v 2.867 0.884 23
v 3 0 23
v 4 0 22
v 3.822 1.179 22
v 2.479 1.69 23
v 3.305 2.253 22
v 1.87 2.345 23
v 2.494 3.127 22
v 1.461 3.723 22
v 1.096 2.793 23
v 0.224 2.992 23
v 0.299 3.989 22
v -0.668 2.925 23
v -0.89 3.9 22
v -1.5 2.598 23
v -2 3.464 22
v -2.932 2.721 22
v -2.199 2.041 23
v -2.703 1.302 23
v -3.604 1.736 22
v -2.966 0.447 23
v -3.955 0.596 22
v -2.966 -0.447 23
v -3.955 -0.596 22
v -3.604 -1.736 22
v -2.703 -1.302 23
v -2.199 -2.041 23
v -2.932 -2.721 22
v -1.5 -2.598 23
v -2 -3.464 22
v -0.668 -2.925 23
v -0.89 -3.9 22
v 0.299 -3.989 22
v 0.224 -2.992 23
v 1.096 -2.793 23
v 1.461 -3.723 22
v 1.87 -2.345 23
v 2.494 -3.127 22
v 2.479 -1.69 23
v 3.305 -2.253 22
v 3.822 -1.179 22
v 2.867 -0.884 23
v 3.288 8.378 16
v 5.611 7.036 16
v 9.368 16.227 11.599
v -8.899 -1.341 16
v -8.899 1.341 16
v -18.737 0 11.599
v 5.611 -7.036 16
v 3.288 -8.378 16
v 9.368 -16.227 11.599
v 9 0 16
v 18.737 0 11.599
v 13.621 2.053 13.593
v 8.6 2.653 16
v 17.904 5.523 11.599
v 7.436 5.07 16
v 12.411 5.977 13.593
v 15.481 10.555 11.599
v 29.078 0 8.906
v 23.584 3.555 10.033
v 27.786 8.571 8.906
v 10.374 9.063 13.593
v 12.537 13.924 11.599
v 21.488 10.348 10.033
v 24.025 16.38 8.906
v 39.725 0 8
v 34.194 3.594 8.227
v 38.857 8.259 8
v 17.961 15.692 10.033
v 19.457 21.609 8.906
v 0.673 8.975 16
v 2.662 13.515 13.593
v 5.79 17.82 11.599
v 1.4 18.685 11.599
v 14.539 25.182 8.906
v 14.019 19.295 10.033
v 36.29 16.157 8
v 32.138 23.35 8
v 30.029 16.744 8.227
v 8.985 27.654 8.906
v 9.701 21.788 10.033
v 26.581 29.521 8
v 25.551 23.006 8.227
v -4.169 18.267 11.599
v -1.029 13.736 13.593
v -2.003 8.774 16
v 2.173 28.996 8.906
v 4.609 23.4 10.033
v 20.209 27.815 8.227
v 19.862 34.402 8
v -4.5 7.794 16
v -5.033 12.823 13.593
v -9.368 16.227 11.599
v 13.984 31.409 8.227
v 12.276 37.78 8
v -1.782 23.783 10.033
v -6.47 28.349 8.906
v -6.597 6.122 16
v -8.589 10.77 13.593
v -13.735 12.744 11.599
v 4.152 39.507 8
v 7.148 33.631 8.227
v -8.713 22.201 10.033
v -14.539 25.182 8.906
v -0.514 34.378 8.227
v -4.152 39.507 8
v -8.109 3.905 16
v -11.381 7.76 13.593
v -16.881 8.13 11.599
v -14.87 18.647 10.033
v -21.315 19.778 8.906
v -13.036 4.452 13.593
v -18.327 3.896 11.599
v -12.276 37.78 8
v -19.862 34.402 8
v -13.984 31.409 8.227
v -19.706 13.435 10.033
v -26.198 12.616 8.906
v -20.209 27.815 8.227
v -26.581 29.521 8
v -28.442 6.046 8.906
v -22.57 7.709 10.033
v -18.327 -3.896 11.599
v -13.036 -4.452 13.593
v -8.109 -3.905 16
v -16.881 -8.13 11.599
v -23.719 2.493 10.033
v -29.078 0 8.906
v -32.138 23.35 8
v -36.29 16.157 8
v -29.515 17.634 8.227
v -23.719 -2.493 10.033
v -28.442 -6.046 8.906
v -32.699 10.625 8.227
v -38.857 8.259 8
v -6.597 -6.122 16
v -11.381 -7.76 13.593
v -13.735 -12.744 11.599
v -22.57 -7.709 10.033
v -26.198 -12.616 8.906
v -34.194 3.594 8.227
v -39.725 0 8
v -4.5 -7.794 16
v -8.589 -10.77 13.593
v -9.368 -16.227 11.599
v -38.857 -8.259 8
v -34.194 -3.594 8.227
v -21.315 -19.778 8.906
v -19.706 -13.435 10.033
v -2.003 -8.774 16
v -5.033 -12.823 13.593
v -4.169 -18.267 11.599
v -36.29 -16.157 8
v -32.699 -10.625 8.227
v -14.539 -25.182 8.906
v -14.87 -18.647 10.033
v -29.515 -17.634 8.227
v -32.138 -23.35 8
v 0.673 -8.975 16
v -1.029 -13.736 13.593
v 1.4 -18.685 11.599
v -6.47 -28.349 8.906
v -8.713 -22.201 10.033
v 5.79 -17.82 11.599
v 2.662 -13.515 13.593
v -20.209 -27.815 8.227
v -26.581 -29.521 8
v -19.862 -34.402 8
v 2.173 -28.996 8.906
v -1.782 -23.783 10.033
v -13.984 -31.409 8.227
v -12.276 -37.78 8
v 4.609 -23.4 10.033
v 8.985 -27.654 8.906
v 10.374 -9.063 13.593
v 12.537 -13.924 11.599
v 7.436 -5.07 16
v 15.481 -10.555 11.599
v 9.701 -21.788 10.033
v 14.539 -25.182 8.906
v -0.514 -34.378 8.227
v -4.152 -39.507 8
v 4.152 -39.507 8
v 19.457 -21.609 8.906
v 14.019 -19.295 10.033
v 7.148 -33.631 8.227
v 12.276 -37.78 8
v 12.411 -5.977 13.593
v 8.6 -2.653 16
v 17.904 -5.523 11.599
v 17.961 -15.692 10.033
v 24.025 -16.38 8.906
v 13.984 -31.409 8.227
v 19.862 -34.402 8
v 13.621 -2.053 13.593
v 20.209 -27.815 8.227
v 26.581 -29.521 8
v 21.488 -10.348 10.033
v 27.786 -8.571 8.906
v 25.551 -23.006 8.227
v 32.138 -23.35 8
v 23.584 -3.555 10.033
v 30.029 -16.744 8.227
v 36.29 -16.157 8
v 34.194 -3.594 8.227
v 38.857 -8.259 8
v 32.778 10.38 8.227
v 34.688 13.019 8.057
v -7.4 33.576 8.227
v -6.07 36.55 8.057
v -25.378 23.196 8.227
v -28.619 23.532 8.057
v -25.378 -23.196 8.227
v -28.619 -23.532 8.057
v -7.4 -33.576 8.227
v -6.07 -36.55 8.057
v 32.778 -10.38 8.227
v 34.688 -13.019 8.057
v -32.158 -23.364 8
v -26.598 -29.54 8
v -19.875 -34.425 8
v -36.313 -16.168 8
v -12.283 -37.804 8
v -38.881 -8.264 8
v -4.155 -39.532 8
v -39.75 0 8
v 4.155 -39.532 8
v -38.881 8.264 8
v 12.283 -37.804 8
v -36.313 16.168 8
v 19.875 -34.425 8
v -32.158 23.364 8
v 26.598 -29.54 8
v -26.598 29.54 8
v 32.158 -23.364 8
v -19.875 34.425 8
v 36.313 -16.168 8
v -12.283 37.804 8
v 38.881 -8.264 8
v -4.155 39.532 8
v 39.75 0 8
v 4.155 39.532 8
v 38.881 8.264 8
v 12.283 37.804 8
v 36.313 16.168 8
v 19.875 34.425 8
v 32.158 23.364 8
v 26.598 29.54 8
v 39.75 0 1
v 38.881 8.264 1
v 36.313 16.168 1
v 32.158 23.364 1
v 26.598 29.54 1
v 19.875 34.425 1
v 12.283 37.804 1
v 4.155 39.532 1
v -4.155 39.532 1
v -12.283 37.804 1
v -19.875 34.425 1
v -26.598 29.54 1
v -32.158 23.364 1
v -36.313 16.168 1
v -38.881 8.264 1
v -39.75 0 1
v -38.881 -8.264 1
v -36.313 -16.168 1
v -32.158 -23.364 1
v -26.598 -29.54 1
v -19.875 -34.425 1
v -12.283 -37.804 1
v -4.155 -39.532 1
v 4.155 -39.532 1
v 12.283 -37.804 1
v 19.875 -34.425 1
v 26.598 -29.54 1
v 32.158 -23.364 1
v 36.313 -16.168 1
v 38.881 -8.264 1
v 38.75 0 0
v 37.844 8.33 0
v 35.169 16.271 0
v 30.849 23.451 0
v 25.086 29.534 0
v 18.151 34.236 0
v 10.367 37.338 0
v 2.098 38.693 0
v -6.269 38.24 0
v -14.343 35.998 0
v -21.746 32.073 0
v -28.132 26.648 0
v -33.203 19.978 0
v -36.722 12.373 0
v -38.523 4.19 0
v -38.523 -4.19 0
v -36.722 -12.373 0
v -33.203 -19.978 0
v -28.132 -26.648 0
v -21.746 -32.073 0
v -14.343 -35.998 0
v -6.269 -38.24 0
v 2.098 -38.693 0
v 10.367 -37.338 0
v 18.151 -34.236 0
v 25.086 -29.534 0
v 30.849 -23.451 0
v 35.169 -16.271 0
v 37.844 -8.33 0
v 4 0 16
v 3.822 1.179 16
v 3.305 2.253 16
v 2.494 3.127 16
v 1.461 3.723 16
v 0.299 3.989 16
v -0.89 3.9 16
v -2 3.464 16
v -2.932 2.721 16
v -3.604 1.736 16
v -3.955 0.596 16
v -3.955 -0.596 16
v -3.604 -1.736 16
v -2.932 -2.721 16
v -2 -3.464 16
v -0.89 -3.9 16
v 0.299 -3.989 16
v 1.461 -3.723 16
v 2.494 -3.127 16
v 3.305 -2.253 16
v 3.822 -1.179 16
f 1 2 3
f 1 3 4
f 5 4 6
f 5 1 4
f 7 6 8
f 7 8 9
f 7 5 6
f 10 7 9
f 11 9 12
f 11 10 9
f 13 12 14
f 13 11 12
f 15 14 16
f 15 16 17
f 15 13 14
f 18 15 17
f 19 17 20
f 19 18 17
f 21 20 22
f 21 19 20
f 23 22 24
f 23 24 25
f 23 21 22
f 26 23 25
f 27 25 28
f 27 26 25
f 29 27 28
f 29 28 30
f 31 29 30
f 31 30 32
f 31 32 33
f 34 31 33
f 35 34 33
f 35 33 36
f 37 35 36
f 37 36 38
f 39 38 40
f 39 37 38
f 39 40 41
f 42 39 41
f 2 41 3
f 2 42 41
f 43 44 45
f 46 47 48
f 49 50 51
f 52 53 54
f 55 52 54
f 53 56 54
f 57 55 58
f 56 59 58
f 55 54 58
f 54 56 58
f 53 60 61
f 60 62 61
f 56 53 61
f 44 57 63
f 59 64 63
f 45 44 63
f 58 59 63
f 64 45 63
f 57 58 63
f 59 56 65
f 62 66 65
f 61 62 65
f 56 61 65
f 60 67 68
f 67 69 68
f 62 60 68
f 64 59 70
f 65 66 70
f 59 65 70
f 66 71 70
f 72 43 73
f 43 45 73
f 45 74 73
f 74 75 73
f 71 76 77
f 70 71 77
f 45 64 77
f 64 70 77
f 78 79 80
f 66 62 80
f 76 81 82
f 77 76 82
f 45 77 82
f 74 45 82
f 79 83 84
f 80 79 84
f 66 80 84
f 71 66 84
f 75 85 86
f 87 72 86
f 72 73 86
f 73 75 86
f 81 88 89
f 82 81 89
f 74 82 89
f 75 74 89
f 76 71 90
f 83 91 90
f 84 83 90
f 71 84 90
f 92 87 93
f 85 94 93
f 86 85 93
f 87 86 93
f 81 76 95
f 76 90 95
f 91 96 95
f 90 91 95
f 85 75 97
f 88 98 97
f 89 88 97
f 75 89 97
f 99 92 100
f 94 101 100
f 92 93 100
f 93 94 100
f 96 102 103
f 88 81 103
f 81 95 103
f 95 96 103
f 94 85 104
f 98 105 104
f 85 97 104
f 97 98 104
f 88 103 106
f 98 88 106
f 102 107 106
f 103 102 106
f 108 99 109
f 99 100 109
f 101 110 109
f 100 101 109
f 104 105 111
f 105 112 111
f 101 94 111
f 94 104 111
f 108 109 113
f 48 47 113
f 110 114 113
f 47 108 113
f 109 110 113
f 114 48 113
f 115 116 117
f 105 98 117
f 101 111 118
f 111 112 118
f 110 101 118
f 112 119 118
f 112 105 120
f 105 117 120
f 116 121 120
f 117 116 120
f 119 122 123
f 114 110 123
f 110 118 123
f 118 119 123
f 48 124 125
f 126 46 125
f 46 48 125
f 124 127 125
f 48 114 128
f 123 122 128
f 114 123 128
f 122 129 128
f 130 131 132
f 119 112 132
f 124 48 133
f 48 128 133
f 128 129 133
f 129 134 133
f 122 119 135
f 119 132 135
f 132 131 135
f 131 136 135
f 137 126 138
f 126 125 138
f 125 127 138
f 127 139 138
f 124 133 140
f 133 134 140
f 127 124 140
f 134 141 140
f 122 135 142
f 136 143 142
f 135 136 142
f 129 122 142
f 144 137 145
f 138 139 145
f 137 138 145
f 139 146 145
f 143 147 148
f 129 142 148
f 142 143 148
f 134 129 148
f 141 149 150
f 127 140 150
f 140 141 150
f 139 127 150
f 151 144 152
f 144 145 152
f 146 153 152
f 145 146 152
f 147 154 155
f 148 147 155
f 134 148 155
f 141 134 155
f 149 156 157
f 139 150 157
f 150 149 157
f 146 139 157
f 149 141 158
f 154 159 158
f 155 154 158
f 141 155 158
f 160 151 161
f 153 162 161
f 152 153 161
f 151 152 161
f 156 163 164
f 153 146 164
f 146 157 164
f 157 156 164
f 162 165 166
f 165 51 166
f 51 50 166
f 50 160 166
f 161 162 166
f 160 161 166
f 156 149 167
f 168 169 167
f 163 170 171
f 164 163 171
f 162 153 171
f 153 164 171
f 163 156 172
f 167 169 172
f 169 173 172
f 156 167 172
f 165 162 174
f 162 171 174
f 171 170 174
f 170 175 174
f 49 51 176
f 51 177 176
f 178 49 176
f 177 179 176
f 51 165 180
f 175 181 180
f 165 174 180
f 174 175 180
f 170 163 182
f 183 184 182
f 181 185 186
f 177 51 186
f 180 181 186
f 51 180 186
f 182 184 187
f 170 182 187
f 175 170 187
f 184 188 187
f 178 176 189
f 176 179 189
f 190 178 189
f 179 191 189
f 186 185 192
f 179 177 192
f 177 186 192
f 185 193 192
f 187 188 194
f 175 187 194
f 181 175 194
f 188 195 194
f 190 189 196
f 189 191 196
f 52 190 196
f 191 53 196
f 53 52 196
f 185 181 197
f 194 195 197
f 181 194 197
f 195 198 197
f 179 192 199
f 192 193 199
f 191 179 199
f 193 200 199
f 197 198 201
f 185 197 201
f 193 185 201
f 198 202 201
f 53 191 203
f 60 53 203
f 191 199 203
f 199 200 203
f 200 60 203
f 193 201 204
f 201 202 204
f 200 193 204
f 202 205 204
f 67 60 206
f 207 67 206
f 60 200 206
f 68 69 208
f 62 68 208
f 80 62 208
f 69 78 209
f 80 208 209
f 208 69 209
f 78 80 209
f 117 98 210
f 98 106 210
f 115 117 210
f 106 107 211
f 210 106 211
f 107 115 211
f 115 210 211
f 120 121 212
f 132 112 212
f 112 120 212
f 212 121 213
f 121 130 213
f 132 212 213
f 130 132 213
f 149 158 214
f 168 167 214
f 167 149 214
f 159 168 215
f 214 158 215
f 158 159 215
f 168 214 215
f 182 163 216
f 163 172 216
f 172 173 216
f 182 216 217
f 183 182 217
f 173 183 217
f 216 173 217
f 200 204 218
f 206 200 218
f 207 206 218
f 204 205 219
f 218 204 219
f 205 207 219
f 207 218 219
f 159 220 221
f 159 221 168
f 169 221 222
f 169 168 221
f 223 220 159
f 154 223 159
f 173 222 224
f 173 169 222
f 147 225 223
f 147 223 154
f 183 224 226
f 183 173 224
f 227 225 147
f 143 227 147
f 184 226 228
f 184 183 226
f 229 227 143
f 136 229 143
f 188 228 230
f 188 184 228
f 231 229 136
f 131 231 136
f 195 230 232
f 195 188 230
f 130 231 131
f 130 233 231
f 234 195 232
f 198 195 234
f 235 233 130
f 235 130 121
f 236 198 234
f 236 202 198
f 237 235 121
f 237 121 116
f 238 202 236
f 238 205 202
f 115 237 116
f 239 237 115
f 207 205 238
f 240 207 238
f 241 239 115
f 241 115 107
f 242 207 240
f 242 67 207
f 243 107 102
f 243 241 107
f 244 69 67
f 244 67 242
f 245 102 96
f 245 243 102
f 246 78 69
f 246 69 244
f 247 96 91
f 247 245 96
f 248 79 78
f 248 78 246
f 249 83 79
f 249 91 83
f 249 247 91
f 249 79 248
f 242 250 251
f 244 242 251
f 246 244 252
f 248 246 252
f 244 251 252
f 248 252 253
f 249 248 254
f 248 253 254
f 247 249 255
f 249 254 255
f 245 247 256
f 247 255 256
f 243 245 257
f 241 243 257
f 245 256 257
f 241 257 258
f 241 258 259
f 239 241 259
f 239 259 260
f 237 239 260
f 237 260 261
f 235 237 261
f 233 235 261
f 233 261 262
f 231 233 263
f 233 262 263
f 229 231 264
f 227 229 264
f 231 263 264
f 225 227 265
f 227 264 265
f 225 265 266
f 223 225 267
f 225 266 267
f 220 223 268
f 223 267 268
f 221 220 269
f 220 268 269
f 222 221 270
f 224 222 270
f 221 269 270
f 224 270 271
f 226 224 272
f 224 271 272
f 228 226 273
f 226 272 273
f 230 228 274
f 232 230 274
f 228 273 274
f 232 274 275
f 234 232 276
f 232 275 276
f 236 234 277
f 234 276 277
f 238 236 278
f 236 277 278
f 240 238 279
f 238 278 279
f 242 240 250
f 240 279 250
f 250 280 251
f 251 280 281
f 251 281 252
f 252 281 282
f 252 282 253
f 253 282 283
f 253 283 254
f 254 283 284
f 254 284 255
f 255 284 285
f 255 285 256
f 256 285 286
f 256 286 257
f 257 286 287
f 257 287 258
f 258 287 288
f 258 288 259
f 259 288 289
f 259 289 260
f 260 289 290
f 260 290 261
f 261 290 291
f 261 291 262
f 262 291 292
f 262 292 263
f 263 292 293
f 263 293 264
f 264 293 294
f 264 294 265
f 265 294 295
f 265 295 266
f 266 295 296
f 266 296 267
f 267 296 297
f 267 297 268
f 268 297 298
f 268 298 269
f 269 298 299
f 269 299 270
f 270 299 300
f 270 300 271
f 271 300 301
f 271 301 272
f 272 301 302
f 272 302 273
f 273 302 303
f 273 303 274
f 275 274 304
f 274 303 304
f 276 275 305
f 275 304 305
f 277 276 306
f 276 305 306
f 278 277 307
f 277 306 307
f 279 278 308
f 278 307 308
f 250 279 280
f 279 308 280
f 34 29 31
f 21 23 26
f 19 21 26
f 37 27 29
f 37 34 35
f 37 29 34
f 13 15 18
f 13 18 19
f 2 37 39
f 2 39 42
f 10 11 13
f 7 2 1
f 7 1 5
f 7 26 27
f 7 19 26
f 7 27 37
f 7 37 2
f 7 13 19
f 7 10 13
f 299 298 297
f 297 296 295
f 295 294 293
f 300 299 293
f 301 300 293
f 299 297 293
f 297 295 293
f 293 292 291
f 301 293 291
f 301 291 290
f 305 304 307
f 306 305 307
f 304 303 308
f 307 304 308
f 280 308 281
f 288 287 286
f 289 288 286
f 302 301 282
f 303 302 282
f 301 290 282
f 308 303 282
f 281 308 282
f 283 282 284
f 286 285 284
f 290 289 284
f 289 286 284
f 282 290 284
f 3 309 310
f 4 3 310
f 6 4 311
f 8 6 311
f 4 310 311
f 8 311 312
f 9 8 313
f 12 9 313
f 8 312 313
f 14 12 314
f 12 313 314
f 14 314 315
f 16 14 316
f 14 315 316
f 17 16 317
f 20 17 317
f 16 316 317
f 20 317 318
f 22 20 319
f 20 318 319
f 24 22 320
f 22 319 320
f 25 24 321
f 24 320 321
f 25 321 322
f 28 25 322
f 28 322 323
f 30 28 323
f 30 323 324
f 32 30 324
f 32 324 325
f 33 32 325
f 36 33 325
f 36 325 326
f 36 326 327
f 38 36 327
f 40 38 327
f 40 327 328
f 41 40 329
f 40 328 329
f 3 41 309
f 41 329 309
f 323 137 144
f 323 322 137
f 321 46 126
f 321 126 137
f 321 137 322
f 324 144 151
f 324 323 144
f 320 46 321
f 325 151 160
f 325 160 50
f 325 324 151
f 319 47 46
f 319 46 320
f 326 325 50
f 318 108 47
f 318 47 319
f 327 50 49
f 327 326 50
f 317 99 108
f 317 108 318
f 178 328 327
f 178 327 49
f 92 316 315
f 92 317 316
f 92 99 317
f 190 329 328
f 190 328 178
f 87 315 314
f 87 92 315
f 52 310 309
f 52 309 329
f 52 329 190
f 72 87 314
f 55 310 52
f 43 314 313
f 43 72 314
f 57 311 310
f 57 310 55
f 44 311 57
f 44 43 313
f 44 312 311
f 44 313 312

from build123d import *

# Parameters (mm, degrees)
SKETCH1_R           = 39.75
BOSS_EXTRUDE1_DEPTH = 8
CHAMFER1_SIZE       = 1
SKETCH2_R           = 9
SKETCH2_R_2         = 4
BOSS_EXTRUDE2_DEPTH = 8
BOSS_EXTRUDE3_START = 8
SKETCH2_3_R         = 4
BOSS_EXTRUDE3_DEPTH = 7
FILLET1_R           = 63
CHAMFER2_SIZE       = 1


with BuildPart() as part:
    # Sketch1 → Boss-Extrude1 (new body)
    with BuildSketch(Plane.XY):
        Circle(SKETCH1_R)
    extrude(amount=BOSS_EXTRUDE1_DEPTH)

    # Chamfer1
    chamfer1_edges = [part.edges().sort_by_distance(p)[0] for p in [
        (-39.75, 0, 0),
    ]]
    chamfer(chamfer1_edges, length=CHAMFER1_SIZE)

    # Sketch2 → Boss-Extrude2 (add)
    # profile 1 of 2: a face of its own
    with BuildSketch(Plane.XY.offset(8)):
        Circle(SKETCH2_R)
        Circle(SKETCH2_R_2, mode=Mode.SUBTRACT)
    # profile 2 of 2: a face of its own
    with BuildSketch(Plane.XY.offset(8)):
        Circle(SKETCH2_R_2)
    extrude(amount=BOSS_EXTRUDE2_DEPTH)

    # Sketch2<3> → Boss-Extrude3 (add)
    with BuildSketch(Plane.XY.offset(8).offset(BOSS_EXTRUDE3_START)):
        Circle(SKETCH2_3_R)
    extrude(amount=BOSS_EXTRUDE3_DEPTH)

    # Fillet1
    # the kernel refuses this fillet: 63 mm, written as the material it adds along each edge
    with BuildSketch(Plane(origin=(0, 0, 8), x_dir=(1, 0, 0), z_dir=(0, -1, 0))) as fillet1_piece_1:
        with BuildLine():
            CenterArc((39.724582991, 63), FILLET1_R, 240.811017564, 29.188982436)
            Line((9, 8), (9, 0))
            Line((9, 0), (39.724582991, 0))
        make_face()
    revolve(axis=Axis((0, 0, 8), (0, 0, 1)))

    # Chamfer2
    chamfer2_edges = [part.edges().sort_by_distance(p)[0] for p in [
        (-4, 0, 23),
    ]]
    chamfer(chamfer2_edges, length=CHAMFER2_SIZE)


solid = part.part
